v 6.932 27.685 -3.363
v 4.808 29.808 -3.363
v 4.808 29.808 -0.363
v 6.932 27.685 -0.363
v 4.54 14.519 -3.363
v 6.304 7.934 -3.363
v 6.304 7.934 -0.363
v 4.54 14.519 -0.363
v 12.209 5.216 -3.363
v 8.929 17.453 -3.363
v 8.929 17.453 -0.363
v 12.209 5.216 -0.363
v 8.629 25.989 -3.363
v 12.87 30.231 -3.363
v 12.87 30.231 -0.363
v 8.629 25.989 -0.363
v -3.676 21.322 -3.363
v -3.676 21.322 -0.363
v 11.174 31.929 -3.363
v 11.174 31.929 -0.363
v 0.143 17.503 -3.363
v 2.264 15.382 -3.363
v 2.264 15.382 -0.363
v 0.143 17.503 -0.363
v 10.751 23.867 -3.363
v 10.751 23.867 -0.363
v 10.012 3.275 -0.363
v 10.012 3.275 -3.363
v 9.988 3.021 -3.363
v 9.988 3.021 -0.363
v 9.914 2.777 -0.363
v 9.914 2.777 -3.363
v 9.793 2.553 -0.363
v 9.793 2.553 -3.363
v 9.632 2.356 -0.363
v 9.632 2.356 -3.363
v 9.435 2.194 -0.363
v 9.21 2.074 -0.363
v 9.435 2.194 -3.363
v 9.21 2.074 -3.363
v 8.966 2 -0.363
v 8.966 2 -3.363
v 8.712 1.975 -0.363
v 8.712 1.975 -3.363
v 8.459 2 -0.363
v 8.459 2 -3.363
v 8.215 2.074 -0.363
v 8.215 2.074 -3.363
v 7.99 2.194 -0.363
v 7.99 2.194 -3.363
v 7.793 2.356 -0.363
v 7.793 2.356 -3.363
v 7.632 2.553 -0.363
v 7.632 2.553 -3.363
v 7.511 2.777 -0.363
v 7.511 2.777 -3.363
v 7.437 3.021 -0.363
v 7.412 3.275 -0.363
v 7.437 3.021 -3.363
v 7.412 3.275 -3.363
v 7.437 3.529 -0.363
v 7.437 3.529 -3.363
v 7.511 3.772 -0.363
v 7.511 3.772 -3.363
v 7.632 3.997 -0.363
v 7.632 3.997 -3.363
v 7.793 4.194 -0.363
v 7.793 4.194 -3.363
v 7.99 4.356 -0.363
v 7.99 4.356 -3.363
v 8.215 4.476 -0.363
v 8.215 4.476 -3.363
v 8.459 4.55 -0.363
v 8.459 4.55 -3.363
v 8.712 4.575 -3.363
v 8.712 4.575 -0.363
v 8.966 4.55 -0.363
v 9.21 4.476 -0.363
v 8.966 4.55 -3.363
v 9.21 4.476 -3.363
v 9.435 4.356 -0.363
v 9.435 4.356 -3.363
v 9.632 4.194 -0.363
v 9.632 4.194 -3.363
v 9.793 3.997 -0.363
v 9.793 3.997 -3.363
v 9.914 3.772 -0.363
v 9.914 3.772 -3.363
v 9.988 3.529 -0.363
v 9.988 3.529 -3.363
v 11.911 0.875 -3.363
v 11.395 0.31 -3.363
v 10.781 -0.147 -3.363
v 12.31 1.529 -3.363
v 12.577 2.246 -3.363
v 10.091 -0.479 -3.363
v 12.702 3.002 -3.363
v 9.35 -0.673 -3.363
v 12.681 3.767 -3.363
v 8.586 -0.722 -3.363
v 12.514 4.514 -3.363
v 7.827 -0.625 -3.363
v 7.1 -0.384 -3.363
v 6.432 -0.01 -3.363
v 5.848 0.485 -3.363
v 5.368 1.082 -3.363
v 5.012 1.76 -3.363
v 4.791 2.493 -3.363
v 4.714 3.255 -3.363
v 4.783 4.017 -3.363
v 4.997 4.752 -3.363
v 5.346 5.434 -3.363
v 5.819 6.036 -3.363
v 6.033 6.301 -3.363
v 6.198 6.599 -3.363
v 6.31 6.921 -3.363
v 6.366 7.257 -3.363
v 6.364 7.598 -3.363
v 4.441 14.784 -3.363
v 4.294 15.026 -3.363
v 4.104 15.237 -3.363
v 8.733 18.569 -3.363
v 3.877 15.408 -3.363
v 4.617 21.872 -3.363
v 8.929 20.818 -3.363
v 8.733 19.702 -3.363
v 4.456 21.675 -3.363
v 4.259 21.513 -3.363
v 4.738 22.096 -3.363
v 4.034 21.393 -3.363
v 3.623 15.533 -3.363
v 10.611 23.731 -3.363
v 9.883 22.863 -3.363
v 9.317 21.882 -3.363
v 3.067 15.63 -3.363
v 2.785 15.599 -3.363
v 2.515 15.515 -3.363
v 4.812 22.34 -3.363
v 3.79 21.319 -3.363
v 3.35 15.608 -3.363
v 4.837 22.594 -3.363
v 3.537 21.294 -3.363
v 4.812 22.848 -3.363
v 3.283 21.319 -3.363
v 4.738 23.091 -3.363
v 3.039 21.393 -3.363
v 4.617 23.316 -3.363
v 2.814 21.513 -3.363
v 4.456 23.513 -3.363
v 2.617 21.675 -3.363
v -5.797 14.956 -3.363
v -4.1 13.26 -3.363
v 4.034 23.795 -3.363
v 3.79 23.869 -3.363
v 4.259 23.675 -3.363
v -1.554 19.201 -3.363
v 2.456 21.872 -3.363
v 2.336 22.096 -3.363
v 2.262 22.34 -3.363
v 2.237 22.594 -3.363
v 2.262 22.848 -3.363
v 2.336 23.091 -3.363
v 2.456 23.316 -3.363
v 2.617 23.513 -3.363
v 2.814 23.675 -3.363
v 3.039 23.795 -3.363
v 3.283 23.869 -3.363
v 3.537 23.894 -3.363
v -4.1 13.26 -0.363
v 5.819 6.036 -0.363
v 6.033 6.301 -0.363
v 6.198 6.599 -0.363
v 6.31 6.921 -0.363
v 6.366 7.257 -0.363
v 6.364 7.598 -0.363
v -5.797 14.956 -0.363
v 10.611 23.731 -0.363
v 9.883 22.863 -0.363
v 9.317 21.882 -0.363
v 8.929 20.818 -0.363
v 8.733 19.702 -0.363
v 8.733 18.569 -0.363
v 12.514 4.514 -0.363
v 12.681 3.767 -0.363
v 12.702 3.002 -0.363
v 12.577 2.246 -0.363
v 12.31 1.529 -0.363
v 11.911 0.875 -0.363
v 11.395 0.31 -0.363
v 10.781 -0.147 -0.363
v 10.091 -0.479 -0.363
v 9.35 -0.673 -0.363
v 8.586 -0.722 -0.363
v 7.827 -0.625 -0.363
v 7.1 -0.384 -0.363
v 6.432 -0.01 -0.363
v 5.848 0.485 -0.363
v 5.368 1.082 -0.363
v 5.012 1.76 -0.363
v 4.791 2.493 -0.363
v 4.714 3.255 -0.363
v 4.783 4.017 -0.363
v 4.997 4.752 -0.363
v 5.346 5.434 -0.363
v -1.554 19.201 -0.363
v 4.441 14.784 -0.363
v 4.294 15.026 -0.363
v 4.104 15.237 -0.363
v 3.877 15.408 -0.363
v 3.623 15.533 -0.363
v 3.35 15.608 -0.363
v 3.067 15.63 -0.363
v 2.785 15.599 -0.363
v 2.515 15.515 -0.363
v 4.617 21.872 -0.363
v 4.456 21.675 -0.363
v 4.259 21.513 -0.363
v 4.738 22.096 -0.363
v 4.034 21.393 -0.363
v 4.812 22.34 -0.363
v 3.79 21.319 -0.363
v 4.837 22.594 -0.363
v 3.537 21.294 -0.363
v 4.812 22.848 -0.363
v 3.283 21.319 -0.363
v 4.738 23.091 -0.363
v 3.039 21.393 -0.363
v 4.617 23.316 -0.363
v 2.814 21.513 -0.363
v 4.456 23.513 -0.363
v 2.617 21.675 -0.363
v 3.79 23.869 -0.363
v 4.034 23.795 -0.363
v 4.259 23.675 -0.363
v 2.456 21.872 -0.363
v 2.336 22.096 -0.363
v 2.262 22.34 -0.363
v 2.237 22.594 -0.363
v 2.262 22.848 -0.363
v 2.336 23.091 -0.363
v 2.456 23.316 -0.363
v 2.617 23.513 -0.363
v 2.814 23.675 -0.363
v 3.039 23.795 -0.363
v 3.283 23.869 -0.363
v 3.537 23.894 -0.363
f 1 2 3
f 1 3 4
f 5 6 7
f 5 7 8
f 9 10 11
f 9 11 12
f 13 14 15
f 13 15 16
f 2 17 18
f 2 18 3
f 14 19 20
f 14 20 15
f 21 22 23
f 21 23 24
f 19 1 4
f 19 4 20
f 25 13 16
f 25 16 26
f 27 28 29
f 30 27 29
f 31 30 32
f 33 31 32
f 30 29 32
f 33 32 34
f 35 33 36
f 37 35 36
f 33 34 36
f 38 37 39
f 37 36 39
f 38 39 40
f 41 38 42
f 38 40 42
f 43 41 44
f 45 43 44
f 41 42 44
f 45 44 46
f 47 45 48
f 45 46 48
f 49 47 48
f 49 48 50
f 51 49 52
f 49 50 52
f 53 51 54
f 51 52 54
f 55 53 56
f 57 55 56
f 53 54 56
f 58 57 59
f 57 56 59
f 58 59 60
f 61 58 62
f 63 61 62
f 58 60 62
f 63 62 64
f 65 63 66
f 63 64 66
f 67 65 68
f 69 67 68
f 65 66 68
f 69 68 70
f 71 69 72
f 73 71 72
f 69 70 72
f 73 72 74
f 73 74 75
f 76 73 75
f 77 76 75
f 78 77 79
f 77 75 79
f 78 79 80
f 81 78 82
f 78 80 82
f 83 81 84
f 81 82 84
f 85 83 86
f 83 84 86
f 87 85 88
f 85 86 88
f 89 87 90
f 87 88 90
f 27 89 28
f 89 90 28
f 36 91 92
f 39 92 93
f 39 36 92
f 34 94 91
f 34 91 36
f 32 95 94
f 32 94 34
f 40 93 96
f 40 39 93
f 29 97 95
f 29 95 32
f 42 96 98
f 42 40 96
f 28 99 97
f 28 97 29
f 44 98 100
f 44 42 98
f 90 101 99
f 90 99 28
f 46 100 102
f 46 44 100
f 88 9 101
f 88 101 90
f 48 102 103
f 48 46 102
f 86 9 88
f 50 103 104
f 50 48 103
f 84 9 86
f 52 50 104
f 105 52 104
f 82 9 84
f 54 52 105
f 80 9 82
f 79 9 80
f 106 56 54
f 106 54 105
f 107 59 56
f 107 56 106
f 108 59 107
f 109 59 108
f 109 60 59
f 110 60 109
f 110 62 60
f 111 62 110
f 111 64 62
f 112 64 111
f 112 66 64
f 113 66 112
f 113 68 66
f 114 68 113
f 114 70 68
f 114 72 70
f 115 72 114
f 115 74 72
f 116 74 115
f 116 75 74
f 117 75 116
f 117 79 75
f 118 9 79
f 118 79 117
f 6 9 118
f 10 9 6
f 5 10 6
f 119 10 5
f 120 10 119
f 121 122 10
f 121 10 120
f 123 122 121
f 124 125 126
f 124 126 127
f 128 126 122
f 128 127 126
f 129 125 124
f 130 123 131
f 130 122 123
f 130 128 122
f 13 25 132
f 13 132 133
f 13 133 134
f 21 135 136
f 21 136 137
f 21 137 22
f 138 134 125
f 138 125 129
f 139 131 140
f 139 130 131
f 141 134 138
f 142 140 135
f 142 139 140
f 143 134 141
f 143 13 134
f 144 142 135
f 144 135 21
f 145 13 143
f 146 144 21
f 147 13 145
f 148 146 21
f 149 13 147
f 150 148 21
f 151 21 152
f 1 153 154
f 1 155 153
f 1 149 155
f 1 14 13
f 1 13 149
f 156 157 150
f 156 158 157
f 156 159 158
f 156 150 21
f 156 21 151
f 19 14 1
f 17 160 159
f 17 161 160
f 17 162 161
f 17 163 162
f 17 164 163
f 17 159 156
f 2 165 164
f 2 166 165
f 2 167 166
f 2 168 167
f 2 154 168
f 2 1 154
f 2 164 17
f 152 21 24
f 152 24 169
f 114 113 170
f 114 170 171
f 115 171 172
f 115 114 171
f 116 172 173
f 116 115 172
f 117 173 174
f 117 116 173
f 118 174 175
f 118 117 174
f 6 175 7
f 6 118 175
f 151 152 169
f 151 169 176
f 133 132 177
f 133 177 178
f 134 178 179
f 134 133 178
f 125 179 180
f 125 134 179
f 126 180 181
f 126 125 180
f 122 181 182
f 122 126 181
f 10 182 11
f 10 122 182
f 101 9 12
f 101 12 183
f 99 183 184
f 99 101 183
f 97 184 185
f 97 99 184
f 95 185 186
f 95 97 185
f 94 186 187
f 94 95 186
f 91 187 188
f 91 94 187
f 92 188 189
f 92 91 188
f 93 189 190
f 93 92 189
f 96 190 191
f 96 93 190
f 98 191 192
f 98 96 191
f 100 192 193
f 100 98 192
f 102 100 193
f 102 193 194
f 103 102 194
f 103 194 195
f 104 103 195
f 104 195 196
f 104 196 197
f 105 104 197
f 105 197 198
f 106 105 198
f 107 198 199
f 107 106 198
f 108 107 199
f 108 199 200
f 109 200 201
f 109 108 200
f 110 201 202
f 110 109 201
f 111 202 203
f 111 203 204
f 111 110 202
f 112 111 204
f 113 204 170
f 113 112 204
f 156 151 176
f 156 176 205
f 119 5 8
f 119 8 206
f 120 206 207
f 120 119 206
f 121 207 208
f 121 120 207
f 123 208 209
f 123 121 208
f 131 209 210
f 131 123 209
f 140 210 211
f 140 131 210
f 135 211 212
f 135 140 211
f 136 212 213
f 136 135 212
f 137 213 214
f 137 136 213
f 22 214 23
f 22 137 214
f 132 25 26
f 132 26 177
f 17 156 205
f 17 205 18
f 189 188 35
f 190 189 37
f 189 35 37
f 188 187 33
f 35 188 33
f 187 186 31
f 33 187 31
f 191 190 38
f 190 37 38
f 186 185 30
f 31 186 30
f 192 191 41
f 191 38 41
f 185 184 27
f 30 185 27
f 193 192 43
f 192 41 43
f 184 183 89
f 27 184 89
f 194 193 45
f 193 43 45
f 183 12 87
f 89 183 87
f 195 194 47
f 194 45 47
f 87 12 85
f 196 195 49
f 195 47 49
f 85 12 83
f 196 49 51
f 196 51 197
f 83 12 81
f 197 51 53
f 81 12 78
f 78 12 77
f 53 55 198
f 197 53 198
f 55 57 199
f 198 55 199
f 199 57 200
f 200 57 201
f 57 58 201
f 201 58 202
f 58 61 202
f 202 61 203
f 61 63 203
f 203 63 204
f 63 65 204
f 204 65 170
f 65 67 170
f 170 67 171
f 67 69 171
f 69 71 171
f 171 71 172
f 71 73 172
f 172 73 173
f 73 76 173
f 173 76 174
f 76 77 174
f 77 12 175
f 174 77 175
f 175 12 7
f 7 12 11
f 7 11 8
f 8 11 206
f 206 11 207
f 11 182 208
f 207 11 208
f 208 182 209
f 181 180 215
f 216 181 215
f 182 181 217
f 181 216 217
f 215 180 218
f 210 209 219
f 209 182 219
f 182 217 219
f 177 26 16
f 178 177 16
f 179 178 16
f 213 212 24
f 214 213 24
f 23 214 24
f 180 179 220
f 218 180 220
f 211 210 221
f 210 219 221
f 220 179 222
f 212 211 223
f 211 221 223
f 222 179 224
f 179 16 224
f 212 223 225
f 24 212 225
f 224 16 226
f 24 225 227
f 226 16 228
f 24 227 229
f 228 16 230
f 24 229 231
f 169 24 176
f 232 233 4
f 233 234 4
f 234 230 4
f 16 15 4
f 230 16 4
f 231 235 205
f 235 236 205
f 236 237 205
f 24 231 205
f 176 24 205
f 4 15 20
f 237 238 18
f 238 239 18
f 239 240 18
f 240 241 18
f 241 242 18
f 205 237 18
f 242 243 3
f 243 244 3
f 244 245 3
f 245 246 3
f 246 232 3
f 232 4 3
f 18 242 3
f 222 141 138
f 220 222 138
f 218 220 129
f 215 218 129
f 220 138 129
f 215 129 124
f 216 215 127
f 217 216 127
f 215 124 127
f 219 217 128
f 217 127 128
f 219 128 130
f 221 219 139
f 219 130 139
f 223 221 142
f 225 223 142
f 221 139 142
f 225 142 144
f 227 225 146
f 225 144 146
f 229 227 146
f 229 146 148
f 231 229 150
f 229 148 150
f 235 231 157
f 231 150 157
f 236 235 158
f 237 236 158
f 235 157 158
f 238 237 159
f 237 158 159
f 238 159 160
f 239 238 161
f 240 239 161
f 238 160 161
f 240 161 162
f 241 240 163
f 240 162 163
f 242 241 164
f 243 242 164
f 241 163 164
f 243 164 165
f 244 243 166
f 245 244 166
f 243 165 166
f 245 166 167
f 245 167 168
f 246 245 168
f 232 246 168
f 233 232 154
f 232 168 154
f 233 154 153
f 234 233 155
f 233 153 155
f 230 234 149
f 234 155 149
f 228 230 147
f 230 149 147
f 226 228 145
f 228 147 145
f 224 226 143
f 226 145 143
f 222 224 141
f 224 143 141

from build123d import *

# Parameters (mm, degrees)
SKETCH_1_R      = 1.3
EXTRUDE_1_DEPTH = 3


with BuildPart() as part:
    # 草图1 → 凸台-拉伸1 (new body)
    with BuildSketch(Plane(origin=(0, 0, -3.362857667), x_dir=(-1, 0, 0), z_dir=(0, 0, -1))):
        with BuildLine():
            Line((-6.304159928, 7.933833034), (-4.539684391, 14.518557193))
            ThreePointArc((-4.539684391, 14.518557193), (-3.62301138, 15.532716808), (-2.264294404, 15.382060533))
            Line((-2.264294404, 15.382060533), (-0.142530428, 17.503217342))
            Line((-0.142530428, 17.503217342), (4.099819599, 13.25965297))
            Line((4.099819599, 13.25965297), (5.796991646, 14.956339352))
            Line((5.796991646, 14.956339352), (1.554014804, 19.200530718))
            Line((1.554014804, 19.200530718), (3.675778781, 21.321687528))
            Line((3.675778781, 21.321687528), (-4.808443123, 29.808337985))
            Line((-4.808443123, 29.808337985), (-6.931968366, 27.685420414))
            Line((-6.931968366, 27.685420414), (-11.174318393, 31.928984786))
            Line((-11.174318393, 31.928984786), (-12.870428791, 30.231215419))
            Line((-12.870428791, 30.231215419), (-8.629080401, 25.98865297))
            Line((-8.629080401, 25.98865297), (-10.750844377, 23.867496161))
            Line((-10.750844377, 23.867496161), (-10.611098311, 23.731253658))
            ThreePointArc((-10.611098311, 23.731253658), (-8.929299443, 20.817545637), (-8.929456987, 17.45330102))
            Line((-8.929456987, 17.45330102), (-12.208534908, 5.216337034))
            ThreePointArc((-12.208534908, 5.216337034), (-8.203956956, -0.691485495), (-5.819308033, 6.03550946))
            ThreePointArc((-5.819308033, 6.03550946), (-6.310108859, 6.921233679), (-6.304159928, 7.933833034))
        make_face()
        with Locations(Location((-8.71249984, 3.274951558, 0), (0, 0, 180))):
            Circle(SKETCH_1_R, mode=Mode.SUBTRACT)
        with Locations(Location((-3.536567574, 22.593983824, 0), (0, 0, 180))):
            Circle(SKETCH_1_R, mode=Mode.SUBTRACT)
    extrude(amount=-EXTRUDE_1_DEPTH)


solid = part.part
